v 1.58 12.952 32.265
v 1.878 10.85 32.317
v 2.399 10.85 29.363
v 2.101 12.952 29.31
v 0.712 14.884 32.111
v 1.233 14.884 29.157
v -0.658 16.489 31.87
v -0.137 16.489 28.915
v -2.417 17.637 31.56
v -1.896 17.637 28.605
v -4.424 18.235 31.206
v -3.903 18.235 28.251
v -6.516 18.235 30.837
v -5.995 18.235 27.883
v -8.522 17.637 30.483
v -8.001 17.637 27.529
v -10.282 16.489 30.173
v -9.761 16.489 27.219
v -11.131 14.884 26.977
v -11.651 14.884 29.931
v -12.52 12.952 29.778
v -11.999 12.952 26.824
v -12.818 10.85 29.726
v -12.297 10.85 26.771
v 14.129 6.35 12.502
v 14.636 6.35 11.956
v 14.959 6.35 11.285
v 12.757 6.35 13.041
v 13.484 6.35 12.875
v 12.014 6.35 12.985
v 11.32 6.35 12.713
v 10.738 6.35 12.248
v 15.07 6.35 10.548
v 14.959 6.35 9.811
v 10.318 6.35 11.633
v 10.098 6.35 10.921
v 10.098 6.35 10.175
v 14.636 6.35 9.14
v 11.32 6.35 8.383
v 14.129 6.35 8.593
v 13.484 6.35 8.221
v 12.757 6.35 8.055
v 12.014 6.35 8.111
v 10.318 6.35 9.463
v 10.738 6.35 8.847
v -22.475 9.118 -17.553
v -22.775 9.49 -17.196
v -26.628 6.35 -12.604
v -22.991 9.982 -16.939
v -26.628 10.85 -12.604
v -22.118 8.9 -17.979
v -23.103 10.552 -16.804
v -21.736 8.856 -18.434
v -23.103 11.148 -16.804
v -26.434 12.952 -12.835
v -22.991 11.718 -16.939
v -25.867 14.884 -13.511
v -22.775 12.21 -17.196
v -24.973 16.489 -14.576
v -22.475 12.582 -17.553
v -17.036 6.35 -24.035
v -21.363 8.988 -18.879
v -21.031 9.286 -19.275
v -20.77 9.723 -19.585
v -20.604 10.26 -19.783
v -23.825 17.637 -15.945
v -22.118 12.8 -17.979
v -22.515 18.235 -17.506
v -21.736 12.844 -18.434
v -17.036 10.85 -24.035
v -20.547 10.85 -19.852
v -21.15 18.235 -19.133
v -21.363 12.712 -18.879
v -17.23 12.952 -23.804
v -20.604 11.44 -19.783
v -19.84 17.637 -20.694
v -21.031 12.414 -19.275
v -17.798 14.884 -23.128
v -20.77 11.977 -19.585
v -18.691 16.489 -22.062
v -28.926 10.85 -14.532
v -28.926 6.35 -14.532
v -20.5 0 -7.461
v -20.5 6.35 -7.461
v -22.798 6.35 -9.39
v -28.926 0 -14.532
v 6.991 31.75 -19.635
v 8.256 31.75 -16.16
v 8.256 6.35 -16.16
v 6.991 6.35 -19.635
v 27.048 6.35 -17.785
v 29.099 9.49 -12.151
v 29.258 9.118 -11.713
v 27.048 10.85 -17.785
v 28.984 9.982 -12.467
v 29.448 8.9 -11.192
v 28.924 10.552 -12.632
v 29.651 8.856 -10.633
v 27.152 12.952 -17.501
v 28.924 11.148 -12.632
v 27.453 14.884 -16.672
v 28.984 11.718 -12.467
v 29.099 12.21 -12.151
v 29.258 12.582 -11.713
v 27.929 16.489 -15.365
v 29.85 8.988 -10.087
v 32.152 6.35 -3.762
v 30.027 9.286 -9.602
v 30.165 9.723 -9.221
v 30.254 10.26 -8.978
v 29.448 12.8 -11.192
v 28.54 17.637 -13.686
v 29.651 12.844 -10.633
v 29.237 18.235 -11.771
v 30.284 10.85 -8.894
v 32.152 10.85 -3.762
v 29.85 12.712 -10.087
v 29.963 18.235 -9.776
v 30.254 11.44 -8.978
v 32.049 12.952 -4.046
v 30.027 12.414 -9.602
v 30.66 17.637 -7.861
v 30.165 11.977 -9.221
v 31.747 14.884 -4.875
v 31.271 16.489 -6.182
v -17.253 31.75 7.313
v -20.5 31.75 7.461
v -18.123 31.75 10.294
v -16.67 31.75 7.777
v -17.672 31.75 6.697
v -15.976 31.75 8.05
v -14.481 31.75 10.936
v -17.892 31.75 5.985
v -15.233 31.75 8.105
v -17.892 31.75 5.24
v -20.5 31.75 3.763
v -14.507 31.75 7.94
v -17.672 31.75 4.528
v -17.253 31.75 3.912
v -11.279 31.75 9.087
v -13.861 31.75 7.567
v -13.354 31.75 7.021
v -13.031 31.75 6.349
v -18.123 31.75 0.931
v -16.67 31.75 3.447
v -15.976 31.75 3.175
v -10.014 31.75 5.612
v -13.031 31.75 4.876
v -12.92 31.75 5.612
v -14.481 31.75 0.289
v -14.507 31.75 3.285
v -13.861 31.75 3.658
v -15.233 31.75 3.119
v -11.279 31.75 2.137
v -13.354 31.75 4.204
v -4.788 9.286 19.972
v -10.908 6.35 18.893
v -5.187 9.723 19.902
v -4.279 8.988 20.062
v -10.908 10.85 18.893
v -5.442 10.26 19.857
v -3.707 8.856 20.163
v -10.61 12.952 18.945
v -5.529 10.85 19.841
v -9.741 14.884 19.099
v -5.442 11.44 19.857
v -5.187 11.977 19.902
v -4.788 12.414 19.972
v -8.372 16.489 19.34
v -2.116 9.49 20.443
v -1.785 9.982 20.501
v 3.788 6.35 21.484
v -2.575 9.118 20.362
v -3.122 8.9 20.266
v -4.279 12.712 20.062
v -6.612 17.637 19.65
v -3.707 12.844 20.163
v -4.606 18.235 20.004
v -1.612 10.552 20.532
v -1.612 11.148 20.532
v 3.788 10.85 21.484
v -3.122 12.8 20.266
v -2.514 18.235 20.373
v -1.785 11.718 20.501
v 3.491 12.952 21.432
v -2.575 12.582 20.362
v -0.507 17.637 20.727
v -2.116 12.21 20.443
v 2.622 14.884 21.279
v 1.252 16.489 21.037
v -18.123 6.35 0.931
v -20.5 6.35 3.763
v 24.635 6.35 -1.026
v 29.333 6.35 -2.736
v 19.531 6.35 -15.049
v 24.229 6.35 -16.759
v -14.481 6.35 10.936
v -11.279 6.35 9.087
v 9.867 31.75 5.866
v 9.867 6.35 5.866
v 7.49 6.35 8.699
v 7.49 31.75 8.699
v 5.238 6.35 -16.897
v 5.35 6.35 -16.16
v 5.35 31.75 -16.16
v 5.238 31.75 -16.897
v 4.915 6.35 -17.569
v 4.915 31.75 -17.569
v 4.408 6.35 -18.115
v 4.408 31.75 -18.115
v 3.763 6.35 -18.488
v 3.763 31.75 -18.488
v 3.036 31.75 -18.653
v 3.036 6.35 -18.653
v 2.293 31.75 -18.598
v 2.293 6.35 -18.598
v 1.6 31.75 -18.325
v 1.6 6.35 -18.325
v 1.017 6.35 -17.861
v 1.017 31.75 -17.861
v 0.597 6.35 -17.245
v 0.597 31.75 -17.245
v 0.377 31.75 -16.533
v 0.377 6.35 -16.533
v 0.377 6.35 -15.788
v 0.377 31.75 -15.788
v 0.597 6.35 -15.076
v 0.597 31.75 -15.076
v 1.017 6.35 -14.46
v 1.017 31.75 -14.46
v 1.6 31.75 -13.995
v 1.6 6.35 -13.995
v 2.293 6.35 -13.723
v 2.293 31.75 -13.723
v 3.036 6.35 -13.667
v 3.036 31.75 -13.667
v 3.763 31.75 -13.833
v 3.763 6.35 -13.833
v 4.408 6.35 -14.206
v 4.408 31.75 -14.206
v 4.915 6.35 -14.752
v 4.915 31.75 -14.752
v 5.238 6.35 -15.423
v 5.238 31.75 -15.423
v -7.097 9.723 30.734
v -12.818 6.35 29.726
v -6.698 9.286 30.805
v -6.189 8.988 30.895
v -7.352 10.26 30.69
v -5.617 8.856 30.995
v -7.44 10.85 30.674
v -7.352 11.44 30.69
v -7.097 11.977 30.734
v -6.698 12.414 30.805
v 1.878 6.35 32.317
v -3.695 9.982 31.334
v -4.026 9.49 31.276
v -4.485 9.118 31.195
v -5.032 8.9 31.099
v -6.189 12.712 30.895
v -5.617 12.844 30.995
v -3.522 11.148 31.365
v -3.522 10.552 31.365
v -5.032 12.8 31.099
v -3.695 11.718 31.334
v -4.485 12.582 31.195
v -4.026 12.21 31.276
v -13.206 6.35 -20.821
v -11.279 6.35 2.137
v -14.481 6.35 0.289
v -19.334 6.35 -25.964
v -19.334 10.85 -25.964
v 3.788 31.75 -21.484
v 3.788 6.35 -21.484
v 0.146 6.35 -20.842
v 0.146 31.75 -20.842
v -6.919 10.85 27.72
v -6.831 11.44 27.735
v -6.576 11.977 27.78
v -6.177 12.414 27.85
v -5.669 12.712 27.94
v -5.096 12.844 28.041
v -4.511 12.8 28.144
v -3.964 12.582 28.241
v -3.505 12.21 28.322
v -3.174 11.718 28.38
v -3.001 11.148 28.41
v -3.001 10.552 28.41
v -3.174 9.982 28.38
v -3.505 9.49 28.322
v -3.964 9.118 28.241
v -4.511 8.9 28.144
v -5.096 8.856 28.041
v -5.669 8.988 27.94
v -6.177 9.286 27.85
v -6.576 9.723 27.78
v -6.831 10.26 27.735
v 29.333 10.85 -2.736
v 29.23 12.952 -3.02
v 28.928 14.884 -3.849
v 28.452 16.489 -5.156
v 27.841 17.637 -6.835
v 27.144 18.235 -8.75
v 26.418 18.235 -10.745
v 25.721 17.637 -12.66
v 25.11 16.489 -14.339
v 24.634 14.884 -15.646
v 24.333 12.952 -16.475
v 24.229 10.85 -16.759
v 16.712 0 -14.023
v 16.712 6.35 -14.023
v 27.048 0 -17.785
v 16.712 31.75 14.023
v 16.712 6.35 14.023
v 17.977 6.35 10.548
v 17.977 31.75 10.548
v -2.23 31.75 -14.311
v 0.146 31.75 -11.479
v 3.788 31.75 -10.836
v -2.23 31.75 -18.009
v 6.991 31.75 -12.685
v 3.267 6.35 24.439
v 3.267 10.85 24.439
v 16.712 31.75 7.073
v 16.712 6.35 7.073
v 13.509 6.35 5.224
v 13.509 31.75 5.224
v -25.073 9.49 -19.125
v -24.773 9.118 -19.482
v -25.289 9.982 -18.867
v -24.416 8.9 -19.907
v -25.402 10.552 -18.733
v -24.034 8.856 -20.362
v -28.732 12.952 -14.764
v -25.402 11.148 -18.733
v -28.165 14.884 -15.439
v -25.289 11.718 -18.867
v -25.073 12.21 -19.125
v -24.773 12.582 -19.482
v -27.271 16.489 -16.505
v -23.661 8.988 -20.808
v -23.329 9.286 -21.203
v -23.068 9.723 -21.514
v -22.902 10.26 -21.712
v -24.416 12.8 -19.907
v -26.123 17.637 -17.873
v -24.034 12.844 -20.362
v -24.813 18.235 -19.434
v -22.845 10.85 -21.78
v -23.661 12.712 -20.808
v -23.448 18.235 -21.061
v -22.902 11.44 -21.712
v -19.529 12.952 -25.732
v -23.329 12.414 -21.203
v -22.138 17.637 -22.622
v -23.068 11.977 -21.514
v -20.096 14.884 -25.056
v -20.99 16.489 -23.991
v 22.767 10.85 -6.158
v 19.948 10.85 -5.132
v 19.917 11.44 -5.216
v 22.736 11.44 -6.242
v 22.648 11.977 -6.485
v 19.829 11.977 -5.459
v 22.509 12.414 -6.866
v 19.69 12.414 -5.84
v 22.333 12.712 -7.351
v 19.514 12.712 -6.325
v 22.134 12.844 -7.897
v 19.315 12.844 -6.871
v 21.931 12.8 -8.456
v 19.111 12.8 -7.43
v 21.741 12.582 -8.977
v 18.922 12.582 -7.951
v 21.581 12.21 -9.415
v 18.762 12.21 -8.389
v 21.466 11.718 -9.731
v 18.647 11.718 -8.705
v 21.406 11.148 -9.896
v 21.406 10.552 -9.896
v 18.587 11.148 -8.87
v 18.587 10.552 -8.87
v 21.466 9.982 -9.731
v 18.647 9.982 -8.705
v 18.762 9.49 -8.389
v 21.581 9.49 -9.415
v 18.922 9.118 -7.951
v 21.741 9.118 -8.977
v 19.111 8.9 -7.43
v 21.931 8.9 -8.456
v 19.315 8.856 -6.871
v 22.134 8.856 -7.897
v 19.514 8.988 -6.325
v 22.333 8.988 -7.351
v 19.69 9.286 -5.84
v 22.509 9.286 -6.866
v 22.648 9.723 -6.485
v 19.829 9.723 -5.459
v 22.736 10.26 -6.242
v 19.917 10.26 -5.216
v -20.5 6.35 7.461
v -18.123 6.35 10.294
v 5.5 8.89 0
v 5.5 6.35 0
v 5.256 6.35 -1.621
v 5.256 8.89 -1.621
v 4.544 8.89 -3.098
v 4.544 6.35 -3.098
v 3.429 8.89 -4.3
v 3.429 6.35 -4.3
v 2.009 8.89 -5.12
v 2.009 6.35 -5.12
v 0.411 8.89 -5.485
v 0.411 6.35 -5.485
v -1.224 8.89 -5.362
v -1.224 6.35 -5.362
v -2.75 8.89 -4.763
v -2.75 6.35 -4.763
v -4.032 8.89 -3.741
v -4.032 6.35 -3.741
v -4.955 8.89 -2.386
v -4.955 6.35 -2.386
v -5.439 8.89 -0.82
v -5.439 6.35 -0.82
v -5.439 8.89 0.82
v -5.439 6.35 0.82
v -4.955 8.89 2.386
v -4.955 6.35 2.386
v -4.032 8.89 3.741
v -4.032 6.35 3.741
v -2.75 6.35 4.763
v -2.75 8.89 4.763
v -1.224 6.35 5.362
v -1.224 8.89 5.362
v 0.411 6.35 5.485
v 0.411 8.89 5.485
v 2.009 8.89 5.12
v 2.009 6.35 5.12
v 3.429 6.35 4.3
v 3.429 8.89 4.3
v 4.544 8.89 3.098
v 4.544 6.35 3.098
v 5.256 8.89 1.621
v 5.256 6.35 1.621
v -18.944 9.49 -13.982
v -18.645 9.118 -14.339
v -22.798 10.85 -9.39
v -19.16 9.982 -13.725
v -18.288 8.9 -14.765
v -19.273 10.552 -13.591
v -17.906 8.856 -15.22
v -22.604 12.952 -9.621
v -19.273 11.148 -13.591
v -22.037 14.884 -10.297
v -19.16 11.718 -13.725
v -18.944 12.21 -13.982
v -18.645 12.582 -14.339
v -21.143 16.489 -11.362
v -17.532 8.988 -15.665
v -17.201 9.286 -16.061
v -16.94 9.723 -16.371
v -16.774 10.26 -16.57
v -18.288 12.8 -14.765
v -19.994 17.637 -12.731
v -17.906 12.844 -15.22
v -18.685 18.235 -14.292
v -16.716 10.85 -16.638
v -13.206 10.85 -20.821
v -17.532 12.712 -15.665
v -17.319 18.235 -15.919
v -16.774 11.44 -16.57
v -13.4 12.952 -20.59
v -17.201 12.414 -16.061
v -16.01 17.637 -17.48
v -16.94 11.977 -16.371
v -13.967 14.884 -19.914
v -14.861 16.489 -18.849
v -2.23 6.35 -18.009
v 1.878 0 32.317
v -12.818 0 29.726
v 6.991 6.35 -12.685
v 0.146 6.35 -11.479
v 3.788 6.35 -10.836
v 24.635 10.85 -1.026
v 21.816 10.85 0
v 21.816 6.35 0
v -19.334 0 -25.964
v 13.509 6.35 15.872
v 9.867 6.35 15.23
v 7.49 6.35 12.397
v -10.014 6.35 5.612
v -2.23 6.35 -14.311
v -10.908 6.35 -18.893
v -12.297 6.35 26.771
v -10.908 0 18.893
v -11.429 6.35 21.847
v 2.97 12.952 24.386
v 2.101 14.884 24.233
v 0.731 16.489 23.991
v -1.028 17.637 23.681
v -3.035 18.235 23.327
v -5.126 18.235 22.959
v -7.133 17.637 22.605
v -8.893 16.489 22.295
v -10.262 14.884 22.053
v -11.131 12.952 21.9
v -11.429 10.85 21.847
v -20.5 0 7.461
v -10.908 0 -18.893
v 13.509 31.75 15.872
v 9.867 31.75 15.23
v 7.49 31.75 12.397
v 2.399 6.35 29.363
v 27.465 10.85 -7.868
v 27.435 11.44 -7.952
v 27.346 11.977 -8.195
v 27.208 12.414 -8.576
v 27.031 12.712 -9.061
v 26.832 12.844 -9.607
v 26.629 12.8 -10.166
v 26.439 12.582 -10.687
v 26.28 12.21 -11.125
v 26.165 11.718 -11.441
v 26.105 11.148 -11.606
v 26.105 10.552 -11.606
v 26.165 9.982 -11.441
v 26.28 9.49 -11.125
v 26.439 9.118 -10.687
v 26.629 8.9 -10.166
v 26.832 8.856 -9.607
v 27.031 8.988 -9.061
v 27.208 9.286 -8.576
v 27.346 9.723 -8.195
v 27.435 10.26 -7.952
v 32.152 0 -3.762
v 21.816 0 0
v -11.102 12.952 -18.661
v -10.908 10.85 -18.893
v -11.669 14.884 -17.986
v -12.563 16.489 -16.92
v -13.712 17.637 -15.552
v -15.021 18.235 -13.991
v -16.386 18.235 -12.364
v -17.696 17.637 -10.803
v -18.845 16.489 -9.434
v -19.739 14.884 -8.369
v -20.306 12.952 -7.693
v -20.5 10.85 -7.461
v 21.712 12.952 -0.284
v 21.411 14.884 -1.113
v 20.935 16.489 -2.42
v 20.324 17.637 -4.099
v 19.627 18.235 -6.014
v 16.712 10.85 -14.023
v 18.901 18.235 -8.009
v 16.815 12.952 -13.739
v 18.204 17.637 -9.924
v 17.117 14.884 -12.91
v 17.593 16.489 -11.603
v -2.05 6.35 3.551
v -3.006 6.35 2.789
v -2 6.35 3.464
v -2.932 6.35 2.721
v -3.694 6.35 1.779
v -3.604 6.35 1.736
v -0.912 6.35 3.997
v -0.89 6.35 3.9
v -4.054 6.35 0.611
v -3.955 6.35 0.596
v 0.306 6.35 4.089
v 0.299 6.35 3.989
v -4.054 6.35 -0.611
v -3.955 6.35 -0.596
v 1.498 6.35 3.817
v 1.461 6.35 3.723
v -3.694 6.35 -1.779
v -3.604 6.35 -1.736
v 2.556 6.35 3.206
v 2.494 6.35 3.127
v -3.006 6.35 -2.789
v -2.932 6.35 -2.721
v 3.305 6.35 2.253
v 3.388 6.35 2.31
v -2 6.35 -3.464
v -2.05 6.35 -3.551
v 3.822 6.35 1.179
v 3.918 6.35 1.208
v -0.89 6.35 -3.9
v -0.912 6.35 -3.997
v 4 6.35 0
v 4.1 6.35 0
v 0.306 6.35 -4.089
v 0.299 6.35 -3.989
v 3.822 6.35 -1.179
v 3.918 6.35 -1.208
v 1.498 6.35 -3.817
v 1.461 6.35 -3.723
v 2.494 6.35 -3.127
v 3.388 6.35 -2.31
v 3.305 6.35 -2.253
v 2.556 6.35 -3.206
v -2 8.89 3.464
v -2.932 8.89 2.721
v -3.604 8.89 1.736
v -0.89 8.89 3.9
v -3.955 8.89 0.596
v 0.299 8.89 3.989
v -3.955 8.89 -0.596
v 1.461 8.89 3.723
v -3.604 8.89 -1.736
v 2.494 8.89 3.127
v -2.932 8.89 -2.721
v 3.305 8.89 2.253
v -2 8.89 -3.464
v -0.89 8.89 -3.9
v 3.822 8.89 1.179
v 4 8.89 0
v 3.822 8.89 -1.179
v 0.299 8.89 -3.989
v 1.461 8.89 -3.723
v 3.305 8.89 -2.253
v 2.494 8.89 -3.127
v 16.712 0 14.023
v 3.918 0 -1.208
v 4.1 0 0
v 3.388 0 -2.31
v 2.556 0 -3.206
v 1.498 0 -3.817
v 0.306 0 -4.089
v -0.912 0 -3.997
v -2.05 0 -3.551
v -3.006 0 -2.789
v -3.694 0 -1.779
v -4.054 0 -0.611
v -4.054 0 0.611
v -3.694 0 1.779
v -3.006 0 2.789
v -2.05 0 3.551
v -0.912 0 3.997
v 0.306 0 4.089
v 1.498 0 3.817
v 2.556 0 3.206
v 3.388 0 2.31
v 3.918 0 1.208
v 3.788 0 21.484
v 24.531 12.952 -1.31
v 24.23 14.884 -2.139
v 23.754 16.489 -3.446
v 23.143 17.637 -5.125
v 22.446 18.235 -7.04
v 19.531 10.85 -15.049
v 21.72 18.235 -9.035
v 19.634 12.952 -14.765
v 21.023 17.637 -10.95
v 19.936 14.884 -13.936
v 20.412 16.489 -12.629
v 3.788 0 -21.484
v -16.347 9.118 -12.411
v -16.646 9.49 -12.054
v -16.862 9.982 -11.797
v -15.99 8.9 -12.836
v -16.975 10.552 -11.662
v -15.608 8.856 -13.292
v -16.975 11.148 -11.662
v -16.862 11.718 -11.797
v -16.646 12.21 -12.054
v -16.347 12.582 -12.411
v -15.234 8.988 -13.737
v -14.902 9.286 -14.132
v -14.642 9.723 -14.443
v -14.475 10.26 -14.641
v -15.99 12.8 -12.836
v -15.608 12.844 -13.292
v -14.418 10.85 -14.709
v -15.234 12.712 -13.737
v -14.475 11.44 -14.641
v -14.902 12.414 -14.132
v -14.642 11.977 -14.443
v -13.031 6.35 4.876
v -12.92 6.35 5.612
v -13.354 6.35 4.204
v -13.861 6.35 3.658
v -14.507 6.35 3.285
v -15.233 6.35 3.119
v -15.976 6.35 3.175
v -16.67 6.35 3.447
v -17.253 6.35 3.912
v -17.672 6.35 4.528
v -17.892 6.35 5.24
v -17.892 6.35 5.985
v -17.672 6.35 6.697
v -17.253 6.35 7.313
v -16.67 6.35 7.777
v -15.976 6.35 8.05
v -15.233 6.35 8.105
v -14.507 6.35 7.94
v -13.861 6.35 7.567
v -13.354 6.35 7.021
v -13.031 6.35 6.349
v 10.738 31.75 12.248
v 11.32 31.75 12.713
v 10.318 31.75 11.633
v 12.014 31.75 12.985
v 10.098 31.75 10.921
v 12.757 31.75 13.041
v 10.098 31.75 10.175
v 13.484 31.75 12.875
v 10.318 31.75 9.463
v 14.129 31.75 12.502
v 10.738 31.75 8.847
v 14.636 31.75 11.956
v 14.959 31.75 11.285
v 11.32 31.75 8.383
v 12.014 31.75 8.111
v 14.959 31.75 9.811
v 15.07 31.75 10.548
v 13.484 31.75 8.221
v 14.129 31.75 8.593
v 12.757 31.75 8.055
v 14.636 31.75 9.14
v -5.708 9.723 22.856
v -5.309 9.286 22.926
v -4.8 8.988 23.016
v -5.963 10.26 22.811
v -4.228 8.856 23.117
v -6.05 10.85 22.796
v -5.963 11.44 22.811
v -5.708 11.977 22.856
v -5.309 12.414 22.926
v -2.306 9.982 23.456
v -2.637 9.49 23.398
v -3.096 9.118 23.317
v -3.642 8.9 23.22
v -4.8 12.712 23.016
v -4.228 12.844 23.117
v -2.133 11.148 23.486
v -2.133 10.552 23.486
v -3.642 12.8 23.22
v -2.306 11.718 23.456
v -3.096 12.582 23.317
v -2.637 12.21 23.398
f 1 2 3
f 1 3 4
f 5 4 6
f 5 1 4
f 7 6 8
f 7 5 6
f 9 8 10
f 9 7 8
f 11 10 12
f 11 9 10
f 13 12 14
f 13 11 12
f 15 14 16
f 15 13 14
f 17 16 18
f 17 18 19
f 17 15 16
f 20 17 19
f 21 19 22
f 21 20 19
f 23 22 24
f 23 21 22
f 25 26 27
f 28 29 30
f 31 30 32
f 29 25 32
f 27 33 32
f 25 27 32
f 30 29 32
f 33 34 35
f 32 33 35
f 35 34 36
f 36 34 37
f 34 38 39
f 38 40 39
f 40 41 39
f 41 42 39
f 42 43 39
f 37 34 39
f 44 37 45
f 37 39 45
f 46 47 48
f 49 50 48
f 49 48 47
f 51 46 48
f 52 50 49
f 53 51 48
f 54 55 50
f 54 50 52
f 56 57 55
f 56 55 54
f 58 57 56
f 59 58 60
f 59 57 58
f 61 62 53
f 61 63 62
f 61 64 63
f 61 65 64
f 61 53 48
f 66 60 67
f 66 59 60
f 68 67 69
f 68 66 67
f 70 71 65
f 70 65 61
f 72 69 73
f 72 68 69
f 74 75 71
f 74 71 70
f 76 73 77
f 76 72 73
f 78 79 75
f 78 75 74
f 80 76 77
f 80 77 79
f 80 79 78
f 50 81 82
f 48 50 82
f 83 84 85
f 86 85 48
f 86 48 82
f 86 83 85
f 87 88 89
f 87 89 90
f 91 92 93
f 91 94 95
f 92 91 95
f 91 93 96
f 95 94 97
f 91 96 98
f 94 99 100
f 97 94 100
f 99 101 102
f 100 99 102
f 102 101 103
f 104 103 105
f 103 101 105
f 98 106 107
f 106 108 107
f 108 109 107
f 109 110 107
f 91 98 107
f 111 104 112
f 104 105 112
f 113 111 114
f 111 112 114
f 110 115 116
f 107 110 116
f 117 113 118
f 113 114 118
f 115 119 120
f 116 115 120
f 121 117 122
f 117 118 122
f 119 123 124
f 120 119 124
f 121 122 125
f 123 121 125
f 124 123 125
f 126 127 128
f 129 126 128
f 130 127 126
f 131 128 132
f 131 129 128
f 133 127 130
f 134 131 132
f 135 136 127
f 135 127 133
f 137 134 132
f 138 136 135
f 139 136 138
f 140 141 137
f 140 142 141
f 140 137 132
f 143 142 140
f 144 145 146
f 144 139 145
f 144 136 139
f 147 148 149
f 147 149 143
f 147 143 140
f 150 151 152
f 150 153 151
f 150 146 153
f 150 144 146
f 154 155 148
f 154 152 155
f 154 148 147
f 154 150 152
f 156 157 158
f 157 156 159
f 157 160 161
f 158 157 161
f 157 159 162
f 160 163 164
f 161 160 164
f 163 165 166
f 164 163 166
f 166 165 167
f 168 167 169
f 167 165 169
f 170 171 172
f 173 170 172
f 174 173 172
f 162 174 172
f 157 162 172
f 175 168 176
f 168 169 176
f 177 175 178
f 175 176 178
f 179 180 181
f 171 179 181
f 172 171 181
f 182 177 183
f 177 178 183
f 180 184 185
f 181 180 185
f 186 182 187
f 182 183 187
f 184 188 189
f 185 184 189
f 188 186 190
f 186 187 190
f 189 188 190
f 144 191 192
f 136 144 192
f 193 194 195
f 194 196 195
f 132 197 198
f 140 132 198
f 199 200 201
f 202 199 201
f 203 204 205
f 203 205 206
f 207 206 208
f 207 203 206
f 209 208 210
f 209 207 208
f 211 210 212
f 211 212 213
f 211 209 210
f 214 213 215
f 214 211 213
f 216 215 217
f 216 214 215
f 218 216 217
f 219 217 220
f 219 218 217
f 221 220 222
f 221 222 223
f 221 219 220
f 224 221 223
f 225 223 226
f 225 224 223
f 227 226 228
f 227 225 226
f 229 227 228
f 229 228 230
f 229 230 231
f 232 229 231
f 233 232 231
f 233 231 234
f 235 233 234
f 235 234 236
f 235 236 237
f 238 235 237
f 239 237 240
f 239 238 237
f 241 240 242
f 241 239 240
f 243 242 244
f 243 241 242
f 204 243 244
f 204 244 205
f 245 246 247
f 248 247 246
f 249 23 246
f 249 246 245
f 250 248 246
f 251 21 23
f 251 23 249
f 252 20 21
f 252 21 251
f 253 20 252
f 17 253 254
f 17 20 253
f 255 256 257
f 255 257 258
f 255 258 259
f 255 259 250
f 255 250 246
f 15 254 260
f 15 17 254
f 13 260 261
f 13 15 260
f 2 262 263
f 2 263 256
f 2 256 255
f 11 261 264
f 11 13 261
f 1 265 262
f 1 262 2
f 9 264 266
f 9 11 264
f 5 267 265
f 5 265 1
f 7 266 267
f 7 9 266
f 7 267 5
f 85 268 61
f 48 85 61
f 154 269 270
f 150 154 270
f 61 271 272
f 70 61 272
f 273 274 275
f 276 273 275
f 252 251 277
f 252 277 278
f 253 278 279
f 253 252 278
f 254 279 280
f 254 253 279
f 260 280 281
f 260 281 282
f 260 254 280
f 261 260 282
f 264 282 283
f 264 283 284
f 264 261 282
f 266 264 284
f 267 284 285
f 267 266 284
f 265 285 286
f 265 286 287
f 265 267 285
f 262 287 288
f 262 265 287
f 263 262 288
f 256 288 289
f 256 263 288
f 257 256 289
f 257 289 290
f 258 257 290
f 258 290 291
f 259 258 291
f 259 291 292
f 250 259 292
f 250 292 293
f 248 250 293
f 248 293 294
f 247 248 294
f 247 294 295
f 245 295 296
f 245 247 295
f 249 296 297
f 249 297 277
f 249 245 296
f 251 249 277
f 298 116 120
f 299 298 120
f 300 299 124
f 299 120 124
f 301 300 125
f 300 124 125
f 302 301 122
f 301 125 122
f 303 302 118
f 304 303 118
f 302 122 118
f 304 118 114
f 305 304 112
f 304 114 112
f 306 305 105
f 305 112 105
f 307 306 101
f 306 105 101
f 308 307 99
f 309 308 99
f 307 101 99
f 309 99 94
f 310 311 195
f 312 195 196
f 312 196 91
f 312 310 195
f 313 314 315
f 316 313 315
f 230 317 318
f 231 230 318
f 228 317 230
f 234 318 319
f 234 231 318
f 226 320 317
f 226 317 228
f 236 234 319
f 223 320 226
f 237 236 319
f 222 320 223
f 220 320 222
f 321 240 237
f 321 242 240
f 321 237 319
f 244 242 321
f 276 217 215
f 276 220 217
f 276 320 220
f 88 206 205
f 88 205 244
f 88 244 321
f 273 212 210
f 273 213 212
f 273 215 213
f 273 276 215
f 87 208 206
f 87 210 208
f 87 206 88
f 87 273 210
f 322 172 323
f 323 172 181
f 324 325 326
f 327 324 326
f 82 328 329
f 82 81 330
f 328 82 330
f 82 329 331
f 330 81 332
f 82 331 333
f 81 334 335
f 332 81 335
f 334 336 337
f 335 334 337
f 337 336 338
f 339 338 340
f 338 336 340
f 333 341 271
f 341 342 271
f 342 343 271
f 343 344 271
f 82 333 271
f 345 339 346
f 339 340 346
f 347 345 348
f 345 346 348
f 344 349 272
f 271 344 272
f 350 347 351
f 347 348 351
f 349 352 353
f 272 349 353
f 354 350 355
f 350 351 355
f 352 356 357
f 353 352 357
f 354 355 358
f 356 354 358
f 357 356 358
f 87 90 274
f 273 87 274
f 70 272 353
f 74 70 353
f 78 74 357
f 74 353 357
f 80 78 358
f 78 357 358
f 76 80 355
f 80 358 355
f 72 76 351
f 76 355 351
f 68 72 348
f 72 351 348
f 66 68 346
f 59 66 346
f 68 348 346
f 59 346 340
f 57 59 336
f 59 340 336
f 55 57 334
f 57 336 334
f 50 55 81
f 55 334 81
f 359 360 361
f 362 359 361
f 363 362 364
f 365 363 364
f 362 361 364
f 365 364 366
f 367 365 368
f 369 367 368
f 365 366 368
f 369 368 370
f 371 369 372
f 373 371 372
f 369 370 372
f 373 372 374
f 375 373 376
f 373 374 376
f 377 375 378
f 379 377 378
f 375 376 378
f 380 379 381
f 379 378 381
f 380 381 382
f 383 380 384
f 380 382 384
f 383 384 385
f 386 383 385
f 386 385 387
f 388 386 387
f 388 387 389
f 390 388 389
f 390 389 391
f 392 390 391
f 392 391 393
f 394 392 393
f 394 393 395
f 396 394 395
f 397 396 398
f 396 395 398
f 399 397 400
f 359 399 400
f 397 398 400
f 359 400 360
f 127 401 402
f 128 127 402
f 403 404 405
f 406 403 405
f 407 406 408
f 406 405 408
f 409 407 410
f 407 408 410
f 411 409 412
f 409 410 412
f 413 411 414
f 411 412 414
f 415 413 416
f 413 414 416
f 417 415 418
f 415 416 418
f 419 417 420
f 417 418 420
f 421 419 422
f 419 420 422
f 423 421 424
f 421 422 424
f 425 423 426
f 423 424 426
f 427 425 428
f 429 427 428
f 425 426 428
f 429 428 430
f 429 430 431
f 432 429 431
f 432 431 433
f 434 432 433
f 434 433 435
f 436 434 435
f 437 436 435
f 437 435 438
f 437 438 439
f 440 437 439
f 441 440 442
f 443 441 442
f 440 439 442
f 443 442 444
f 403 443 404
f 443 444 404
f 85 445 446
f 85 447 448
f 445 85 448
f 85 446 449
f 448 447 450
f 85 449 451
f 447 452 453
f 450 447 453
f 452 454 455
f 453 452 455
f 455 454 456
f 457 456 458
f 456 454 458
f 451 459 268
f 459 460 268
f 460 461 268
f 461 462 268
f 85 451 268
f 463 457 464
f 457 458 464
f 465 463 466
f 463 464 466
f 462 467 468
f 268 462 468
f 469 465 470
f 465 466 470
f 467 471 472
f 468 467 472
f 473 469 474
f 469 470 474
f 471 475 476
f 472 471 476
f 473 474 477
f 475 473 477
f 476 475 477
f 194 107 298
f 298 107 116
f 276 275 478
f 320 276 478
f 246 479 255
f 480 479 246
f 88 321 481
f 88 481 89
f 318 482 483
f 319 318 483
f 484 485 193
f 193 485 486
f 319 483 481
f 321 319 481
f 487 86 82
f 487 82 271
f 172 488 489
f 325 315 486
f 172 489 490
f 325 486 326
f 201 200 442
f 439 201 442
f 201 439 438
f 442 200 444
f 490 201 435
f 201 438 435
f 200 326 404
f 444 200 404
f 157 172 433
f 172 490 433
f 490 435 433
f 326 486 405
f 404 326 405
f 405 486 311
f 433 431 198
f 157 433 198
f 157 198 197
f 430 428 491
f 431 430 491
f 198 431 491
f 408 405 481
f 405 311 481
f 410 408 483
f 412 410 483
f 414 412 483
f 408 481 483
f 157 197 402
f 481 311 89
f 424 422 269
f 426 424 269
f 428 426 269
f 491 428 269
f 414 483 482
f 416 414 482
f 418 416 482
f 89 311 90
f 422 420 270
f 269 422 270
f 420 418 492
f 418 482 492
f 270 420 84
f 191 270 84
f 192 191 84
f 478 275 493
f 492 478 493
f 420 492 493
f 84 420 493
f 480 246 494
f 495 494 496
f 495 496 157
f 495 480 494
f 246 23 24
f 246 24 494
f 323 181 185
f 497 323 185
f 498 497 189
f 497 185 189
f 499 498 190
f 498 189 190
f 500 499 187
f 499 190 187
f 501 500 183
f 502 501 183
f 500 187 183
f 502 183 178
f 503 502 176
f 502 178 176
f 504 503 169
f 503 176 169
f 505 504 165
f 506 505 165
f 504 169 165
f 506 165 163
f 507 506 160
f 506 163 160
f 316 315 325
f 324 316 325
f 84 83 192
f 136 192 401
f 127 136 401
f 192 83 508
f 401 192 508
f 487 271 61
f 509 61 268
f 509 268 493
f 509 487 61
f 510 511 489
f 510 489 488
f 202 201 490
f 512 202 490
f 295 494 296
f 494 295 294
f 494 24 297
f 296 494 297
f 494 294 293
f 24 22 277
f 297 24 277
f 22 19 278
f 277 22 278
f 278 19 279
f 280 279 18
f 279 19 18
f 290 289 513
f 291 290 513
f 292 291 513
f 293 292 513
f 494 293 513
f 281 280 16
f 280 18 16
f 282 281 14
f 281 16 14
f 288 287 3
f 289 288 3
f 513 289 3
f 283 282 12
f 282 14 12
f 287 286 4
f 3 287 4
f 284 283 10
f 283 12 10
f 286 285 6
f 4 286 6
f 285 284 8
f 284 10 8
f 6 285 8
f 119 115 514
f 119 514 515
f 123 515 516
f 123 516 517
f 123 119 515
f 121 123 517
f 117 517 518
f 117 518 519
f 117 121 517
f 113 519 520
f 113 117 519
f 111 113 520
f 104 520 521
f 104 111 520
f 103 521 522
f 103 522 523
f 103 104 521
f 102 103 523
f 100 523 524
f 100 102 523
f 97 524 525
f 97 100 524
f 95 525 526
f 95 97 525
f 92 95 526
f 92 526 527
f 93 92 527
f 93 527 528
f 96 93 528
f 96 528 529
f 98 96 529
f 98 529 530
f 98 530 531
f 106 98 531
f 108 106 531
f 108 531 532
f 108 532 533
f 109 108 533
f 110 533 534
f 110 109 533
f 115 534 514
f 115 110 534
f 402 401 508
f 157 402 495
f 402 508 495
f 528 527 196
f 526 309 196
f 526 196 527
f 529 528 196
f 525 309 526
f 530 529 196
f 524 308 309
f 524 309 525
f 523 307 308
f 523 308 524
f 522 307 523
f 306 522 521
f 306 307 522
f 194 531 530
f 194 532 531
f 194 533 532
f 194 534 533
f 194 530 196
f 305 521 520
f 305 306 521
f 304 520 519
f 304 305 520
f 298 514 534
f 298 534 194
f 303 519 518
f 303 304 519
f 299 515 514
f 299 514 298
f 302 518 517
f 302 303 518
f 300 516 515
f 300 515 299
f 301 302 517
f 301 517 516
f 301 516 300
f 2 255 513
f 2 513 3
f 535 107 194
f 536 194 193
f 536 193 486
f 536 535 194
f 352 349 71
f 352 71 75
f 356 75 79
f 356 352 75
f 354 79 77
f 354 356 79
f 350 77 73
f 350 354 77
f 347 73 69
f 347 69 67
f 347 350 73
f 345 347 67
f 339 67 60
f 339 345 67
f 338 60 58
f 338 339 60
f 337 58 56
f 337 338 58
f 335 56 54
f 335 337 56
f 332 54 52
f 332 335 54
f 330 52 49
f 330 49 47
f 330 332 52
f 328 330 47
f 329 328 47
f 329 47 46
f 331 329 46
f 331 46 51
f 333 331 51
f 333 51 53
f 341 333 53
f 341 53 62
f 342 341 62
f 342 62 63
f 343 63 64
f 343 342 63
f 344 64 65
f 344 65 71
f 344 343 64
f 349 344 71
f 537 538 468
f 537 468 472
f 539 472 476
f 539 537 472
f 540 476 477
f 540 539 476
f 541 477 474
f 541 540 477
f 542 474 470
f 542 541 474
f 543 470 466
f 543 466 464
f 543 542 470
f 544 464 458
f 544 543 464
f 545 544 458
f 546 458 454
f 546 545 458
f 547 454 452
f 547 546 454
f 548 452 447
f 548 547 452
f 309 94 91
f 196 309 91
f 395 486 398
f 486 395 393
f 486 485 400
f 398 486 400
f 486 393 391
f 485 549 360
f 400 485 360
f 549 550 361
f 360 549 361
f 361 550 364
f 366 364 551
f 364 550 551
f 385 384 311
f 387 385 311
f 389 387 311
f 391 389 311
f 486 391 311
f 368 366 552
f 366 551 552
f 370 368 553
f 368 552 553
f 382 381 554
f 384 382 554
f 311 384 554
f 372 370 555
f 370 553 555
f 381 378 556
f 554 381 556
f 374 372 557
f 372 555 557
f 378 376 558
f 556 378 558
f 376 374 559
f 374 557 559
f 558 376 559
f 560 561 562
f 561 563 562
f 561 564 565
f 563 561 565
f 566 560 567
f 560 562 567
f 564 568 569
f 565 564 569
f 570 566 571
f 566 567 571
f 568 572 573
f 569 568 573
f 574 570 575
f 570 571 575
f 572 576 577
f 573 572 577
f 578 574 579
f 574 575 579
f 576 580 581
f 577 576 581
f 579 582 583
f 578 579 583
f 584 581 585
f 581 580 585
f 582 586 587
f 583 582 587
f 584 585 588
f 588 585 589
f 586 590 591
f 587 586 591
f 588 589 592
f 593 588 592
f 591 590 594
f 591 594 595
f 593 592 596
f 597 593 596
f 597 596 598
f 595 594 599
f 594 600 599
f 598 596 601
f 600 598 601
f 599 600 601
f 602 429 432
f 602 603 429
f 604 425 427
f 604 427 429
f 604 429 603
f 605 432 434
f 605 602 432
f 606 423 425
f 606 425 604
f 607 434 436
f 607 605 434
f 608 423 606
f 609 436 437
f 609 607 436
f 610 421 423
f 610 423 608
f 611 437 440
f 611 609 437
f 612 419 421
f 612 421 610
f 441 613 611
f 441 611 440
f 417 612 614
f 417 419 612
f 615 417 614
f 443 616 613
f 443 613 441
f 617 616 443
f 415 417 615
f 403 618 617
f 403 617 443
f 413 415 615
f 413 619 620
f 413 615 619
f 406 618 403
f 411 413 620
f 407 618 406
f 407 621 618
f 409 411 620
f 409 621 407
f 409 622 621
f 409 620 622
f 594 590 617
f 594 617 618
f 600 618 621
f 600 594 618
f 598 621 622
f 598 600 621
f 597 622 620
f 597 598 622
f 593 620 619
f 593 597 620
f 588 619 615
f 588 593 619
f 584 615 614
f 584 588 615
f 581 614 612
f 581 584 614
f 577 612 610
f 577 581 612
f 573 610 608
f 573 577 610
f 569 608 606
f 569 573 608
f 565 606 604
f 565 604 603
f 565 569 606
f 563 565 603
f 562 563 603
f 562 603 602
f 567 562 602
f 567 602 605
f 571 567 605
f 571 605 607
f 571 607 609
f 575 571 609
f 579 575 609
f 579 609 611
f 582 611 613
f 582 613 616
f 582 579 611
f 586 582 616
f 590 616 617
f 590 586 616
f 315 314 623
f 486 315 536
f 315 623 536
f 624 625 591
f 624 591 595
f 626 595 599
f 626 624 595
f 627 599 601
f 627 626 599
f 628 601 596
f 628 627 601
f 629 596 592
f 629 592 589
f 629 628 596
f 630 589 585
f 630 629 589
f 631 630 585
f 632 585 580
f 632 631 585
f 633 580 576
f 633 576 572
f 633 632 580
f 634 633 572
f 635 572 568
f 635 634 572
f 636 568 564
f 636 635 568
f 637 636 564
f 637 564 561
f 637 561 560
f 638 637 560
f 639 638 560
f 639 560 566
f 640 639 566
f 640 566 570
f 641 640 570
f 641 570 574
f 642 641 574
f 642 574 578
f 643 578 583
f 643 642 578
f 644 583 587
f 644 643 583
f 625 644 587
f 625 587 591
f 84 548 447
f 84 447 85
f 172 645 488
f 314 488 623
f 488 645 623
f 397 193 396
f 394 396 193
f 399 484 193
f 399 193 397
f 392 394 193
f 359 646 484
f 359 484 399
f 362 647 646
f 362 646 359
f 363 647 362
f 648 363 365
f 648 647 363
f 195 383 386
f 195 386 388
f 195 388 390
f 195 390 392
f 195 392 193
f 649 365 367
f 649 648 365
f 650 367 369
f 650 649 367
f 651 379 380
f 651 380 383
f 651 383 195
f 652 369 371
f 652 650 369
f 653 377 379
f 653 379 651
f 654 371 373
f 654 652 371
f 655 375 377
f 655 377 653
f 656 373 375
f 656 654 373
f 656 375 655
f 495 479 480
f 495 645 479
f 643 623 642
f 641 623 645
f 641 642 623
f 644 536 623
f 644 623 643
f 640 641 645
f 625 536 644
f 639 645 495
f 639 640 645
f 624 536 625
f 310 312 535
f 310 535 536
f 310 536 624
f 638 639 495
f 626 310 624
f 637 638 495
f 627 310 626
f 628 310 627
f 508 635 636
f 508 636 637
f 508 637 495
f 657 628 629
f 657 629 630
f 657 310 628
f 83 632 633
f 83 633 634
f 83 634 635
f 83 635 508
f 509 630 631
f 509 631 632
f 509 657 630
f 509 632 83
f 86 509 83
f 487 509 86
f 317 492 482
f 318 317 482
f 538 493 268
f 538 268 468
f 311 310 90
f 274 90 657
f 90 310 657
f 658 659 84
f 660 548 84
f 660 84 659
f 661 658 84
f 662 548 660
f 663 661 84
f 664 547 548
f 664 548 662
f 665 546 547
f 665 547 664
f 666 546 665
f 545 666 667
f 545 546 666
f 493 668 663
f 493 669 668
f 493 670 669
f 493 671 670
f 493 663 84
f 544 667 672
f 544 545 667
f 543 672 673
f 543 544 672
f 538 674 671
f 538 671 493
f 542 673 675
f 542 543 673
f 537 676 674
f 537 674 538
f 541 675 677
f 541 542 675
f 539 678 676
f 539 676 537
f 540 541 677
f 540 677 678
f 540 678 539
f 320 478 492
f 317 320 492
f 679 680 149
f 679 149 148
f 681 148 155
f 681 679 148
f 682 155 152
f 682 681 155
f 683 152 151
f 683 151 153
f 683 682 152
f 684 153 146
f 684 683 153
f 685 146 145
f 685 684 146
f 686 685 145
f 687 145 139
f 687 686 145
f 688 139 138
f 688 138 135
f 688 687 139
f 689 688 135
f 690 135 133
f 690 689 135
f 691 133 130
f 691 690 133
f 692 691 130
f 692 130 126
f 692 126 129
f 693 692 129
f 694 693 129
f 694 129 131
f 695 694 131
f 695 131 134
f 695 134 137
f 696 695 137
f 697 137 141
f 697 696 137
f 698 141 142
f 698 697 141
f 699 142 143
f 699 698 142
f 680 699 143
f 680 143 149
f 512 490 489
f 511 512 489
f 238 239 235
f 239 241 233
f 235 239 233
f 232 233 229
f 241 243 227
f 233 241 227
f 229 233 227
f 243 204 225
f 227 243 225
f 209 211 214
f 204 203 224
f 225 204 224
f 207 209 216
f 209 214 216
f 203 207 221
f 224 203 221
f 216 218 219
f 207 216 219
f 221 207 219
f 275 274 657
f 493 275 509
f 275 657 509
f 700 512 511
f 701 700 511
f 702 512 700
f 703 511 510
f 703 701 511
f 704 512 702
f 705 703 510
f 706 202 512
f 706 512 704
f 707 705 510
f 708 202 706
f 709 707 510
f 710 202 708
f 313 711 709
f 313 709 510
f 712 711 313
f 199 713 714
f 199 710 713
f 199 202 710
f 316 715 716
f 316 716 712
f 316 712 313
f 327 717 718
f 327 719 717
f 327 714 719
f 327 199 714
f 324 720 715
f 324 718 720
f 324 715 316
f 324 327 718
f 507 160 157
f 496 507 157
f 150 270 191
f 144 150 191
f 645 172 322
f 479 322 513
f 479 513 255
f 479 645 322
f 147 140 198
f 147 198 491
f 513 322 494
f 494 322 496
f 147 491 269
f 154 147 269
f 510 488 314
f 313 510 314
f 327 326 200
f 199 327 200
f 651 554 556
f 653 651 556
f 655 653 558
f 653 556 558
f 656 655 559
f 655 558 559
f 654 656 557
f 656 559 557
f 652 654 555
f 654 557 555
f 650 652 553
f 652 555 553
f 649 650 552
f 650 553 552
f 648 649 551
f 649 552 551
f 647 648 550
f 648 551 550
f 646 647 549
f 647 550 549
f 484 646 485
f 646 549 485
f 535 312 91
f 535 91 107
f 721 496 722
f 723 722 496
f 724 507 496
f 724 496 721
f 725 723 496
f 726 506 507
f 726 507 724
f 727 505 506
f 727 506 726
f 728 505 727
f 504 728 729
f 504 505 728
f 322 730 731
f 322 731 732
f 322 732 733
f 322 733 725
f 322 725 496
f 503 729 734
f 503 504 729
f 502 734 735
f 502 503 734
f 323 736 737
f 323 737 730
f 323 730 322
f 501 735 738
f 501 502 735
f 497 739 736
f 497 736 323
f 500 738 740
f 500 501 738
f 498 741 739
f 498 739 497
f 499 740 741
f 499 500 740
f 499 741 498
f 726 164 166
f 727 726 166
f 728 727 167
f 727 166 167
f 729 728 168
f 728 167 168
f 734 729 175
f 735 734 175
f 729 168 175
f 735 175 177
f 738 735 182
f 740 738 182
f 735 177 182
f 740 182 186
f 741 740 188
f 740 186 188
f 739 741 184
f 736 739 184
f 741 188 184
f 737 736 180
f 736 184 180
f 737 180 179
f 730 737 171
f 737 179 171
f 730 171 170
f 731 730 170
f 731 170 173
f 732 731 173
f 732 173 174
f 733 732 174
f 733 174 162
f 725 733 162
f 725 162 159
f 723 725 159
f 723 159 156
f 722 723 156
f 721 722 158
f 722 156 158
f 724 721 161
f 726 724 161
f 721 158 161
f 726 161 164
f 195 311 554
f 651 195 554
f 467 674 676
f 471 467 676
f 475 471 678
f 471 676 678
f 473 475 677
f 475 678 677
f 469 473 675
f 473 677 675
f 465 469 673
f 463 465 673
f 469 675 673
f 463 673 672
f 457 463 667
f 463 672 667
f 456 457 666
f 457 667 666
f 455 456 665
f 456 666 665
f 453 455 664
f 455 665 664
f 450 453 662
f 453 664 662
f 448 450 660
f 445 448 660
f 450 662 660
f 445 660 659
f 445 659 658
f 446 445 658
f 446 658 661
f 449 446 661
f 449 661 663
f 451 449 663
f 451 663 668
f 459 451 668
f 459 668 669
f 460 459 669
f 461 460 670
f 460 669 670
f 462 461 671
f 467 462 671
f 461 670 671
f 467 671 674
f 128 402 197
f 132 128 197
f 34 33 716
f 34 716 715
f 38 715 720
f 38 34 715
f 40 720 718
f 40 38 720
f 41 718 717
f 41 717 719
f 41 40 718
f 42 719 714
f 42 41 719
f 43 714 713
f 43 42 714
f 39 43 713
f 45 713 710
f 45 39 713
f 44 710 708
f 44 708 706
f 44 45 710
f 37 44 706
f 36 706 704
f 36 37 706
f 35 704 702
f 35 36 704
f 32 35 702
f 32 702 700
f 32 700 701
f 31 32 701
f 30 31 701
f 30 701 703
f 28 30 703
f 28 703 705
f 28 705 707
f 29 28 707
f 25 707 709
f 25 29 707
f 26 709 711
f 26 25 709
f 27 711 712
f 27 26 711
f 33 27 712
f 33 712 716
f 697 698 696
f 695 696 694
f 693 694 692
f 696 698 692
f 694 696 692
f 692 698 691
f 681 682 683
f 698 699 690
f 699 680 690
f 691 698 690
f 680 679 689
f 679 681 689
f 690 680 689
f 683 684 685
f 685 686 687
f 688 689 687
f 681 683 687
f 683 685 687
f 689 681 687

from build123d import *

# Parameters (mm, degrees)
SKETCH1_R            = 4.1
BOSS_EXTRUDE1_DEPTH  = 6.35
SKETCH4_R            = 2
BOSS_EXTRUDE2_DEPTH  = 3
SKETCH6_R            = 1.999996081
BOSS_EXTRUDE4_DEPTH  = 3
SKETCH8_R            = 1.999996
BOSS_EXTRUDE5_DEPTH  = 3
SKETCH9_R            = 1.999996
BOSS_EXTRUDE6_DEPTH  = 3
SKETCH10_R           = 1.999996
BOSS_EXTRUDE7_DEPTH  = 3
SKETCH11_R           = 1.999996
BOSS_EXTRUDE8_DEPTH  = 3
SKETCH12_R           = 2.5
BOSS_EXTRUDE9_DEPTH  = 25.4
SKETCH15_R           = 5.5
SKETCH15_R_2         = 4
BOSS_EXTRUDE10_DEPTH = 2.54


with BuildPart() as part:
    # Sketch1 → Boss-Extrude1 (new body)
    with BuildSketch(Plane(origin=(0, 0, 0), x_dir=(1, 0, 0), z_dir=(0, 1, 0))):
        Polygon((1.878116929, -32.317100962), (-12.817952122, -29.725787478), (-10.907822168, -18.892902195), (3.788246884, -21.484215679), align=None)
        Polygon((-10.907822168, -18.892902195), (3.788246884, -21.484215679), (16.711753116, -14.022825876), (21.815644336, 0), (16.711753116, 14.022825876), (3.788246884, 21.484215679), (-10.907822168, 18.892902195), (-20.5, 7.461389802), (-20.5, -7.461389802), align=None)
        Circle(SKETCH1_R, mode=Mode.SUBTRACT)
        Polygon((27.048371945, 17.785047453), (32.152263164, 3.762221577), (21.815644336, 0), (16.711753116, 14.022825876), align=None)
        Polygon((-28.926488874, 14.532053509), (-19.334311042, 25.963565901), (-10.907822168, 18.892902195), (-20.5, 7.461389802), align=None)
    extrude(amount=BOSS_EXTRUDE1_DEPTH)

    # Sketch4 → Boss-Extrude2 (add)
    with BuildSketch(Plane(origin=(-5.469917597, 0, 31.02144422), x_dir=(-0.984807753, 0, -0.173648178), z_dir=(0.173648178, 0, -0.984807753))):
        with BuildLine():
            Line((-7.461389802, 6.35), (-7.461389802, 10.84999989))
            ThreePointArc((-7.461389802, 10.84999989), (0, 18.311389692), (7.461389802, 10.84999989))
            Line((7.461389802, 10.84999989), (7.461389802, 6.35))
            Line((7.461389802, 6.35), (-7.461389802, 6.35))
        make_face()
        with Locations((0, 10.84999989)):
            Circle(SKETCH4_R, mode=Mode.SUBTRACT)
    extrude(amount=BOSS_EXTRUDE2_DEPTH)

    # Sketch6 → Boss-Extrude4 (add)
    with BuildSketch(Plane(origin=(-3.559787642, 0, 20.188558937), x_dir=(-0.984807753, 0, -0.173648178), z_dir=(0.173648178, 0, -0.984807753))):
        with BuildLine():
            Line((-7.461389802, 6.35), (-7.461389802, 10.85))
            ThreePointArc((-7.461389802, 10.85), (0, 18.311389802), (7.461389802, 10.85))
            Line((7.461389802, 10.85), (7.461389802, 6.35))
            Line((7.461389802, 6.35), (-7.461389802, 6.35))
        make_face()
        with Locations((0, 10.85)):
            Circle(SKETCH6_R, mode=Mode.SUBTRACT)
    extrude(amount=-BOSS_EXTRUDE4_DEPTH)

    # Sketch8 → Boss-Extrude5 (add)
    with BuildSketch(Plane(origin=(29.600317555, 0, -10.773634515), x_dir=(0.342020143, 0, 0.939692621), z_dir=(-0.939692621, 0, 0.342020143))):
        with BuildLine():
            Line((-7.461389802, 10.85), (-7.461389802, 6.35))
            Line((-7.461389802, 6.35), (7.461389802, 6.35))
            Line((7.461389802, 6.35), (7.461389802, 10.85))
            ThreePointArc((7.461389802, 10.85), (0, 18.311389802), (-7.461389802, 10.85))
        make_face()
        with Locations((0, 10.85)):
            Circle(SKETCH8_R, mode=Mode.SUBTRACT)
    extrude(amount=BOSS_EXTRUDE5_DEPTH)

    # Sketch9 → Boss-Extrude6 (add)
    with BuildSketch(Plane(origin=(19.263698726, 0, -7.011412938), x_dir=(0.342020143, 0, 0.939692621), z_dir=(-0.939692621, 0, 0.342020143))):
        with BuildLine():
            Line((-7.461389802, 6.35), (-7.461389802, 10.85))
            ThreePointArc((-7.461389802, 10.85), (0, 18.311389802), (7.461389802, 10.85))
            Line((7.461389802, 10.85), (7.461389802, 6.35))
            Line((7.461389802, 6.35), (-7.461389802, 6.35))
        make_face()
        with Locations((0, 10.85)):
            Circle(SKETCH9_R, mode=Mode.SUBTRACT)
    extrude(amount=-BOSS_EXTRUDE6_DEPTH)

    # Sketch10 → Boss-Extrude7 (add)
    with BuildSketch(Plane(origin=(-24.130399958, 0, -20.247809705), x_dir=(0.64278761, 0, -0.766044443), z_dir=(0.766044443, 0, 0.64278761))):
        with BuildLine():
            Line((-7.461389802, 10.85), (-7.461389802, 6.35))
            Line((-7.461389802, 6.35), (7.461389802, 6.35))
            Line((7.461389802, 6.35), (7.461389802, 10.85))
            ThreePointArc((7.461389802, 10.85), (0, 18.311389802), (-7.461389802, 10.85))
        make_face()
        with Locations((0, 10.85)):
            Circle(SKETCH10_R, mode=Mode.SUBTRACT)
    extrude(amount=BOSS_EXTRUDE7_DEPTH)

    # Sketch11 → Boss-Extrude8 (add)
    with BuildSketch(Plane(origin=(-15.703911084, 0, -13.177145999), x_dir=(0.64278761, 0, -0.766044443), z_dir=(0.766044443, 0, 0.64278761))):
        with BuildLine():
            Line((-7.461389802, 10.85), (-7.461389802, 6.35))
            Line((-7.461389802, 6.35), (7.461389802, 6.35))
            Line((7.461389802, 6.35), (7.461389802, 10.85))
            ThreePointArc((7.461389802, 10.85), (0, 18.311389802), (-7.461389802, 10.85))
        make_face()
        with Locations((0, 10.85)):
            Circle(SKETCH11_R, mode=Mode.SUBTRACT)
    extrude(amount=-BOSS_EXTRUDE8_DEPTH)

    # Sketch12 → Boss-Extrude9 (add)
    with BuildSketch(Plane(origin=(0, 6.35, 0), x_dir=(1, 0, 0), z_dir=(0, 1, 0))):
        Polygon((16.711753116, -14.022825876), (17.976522258, -10.54790122), (16.711753116, -7.072976564), (13.50924523, -5.224007774), (9.867487631, -5.866147896), (7.490499173, -8.69893243), (7.490499173, -12.39687001), (9.867487631, -15.229654545), (13.50924523, -15.871794666), align=None)
        with Locations((12.570499173, -10.54790122)):
            Circle(SKETCH12_R, mode=Mode.SUBTRACT)
        Polygon((6.99075477, 12.685397576), (8.255523911, 16.160322233), (6.99075477, 19.635246889), (3.788246884, 21.484215679), (0.146489284, 20.842075557), (-2.230499173, 18.009291023), (-2.230499173, 14.311353442), (0.146489284, 11.478568908), (3.788246884, 10.836428786), align=None)
        with Locations((2.849500827, 16.160322233)):
            Circle(SKETCH12_R, mode=Mode.SUBTRACT)
        Polygon((-20.5, -7.461389802), (-18.123011542, -10.294174337), (-14.481253943, -10.936314459), (-11.278746057, -9.087345669), (-10.013976916, -5.612421012), (-11.278746057, -2.137496356), (-14.481253943, -0.288527566), (-18.123011542, -0.930667688), (-20.5, -3.763452222), align=None)
        with Locations((-15.42, -5.612421012)):
            Circle(SKETCH12_R, mode=Mode.SUBTRACT)
    extrude(amount=BOSS_EXTRUDE9_DEPTH)

    # Sketch15 → Boss-Extrude10 (add)
    with BuildSketch(Plane(origin=(0, 6.35, 0), x_dir=(1, 0, 0), z_dir=(0, 1, 0))):
        Circle(SKETCH15_R)
        Circle(SKETCH15_R_2, mode=Mode.SUBTRACT)
    extrude(amount=BOSS_EXTRUDE10_DEPTH)


solid = part.part
